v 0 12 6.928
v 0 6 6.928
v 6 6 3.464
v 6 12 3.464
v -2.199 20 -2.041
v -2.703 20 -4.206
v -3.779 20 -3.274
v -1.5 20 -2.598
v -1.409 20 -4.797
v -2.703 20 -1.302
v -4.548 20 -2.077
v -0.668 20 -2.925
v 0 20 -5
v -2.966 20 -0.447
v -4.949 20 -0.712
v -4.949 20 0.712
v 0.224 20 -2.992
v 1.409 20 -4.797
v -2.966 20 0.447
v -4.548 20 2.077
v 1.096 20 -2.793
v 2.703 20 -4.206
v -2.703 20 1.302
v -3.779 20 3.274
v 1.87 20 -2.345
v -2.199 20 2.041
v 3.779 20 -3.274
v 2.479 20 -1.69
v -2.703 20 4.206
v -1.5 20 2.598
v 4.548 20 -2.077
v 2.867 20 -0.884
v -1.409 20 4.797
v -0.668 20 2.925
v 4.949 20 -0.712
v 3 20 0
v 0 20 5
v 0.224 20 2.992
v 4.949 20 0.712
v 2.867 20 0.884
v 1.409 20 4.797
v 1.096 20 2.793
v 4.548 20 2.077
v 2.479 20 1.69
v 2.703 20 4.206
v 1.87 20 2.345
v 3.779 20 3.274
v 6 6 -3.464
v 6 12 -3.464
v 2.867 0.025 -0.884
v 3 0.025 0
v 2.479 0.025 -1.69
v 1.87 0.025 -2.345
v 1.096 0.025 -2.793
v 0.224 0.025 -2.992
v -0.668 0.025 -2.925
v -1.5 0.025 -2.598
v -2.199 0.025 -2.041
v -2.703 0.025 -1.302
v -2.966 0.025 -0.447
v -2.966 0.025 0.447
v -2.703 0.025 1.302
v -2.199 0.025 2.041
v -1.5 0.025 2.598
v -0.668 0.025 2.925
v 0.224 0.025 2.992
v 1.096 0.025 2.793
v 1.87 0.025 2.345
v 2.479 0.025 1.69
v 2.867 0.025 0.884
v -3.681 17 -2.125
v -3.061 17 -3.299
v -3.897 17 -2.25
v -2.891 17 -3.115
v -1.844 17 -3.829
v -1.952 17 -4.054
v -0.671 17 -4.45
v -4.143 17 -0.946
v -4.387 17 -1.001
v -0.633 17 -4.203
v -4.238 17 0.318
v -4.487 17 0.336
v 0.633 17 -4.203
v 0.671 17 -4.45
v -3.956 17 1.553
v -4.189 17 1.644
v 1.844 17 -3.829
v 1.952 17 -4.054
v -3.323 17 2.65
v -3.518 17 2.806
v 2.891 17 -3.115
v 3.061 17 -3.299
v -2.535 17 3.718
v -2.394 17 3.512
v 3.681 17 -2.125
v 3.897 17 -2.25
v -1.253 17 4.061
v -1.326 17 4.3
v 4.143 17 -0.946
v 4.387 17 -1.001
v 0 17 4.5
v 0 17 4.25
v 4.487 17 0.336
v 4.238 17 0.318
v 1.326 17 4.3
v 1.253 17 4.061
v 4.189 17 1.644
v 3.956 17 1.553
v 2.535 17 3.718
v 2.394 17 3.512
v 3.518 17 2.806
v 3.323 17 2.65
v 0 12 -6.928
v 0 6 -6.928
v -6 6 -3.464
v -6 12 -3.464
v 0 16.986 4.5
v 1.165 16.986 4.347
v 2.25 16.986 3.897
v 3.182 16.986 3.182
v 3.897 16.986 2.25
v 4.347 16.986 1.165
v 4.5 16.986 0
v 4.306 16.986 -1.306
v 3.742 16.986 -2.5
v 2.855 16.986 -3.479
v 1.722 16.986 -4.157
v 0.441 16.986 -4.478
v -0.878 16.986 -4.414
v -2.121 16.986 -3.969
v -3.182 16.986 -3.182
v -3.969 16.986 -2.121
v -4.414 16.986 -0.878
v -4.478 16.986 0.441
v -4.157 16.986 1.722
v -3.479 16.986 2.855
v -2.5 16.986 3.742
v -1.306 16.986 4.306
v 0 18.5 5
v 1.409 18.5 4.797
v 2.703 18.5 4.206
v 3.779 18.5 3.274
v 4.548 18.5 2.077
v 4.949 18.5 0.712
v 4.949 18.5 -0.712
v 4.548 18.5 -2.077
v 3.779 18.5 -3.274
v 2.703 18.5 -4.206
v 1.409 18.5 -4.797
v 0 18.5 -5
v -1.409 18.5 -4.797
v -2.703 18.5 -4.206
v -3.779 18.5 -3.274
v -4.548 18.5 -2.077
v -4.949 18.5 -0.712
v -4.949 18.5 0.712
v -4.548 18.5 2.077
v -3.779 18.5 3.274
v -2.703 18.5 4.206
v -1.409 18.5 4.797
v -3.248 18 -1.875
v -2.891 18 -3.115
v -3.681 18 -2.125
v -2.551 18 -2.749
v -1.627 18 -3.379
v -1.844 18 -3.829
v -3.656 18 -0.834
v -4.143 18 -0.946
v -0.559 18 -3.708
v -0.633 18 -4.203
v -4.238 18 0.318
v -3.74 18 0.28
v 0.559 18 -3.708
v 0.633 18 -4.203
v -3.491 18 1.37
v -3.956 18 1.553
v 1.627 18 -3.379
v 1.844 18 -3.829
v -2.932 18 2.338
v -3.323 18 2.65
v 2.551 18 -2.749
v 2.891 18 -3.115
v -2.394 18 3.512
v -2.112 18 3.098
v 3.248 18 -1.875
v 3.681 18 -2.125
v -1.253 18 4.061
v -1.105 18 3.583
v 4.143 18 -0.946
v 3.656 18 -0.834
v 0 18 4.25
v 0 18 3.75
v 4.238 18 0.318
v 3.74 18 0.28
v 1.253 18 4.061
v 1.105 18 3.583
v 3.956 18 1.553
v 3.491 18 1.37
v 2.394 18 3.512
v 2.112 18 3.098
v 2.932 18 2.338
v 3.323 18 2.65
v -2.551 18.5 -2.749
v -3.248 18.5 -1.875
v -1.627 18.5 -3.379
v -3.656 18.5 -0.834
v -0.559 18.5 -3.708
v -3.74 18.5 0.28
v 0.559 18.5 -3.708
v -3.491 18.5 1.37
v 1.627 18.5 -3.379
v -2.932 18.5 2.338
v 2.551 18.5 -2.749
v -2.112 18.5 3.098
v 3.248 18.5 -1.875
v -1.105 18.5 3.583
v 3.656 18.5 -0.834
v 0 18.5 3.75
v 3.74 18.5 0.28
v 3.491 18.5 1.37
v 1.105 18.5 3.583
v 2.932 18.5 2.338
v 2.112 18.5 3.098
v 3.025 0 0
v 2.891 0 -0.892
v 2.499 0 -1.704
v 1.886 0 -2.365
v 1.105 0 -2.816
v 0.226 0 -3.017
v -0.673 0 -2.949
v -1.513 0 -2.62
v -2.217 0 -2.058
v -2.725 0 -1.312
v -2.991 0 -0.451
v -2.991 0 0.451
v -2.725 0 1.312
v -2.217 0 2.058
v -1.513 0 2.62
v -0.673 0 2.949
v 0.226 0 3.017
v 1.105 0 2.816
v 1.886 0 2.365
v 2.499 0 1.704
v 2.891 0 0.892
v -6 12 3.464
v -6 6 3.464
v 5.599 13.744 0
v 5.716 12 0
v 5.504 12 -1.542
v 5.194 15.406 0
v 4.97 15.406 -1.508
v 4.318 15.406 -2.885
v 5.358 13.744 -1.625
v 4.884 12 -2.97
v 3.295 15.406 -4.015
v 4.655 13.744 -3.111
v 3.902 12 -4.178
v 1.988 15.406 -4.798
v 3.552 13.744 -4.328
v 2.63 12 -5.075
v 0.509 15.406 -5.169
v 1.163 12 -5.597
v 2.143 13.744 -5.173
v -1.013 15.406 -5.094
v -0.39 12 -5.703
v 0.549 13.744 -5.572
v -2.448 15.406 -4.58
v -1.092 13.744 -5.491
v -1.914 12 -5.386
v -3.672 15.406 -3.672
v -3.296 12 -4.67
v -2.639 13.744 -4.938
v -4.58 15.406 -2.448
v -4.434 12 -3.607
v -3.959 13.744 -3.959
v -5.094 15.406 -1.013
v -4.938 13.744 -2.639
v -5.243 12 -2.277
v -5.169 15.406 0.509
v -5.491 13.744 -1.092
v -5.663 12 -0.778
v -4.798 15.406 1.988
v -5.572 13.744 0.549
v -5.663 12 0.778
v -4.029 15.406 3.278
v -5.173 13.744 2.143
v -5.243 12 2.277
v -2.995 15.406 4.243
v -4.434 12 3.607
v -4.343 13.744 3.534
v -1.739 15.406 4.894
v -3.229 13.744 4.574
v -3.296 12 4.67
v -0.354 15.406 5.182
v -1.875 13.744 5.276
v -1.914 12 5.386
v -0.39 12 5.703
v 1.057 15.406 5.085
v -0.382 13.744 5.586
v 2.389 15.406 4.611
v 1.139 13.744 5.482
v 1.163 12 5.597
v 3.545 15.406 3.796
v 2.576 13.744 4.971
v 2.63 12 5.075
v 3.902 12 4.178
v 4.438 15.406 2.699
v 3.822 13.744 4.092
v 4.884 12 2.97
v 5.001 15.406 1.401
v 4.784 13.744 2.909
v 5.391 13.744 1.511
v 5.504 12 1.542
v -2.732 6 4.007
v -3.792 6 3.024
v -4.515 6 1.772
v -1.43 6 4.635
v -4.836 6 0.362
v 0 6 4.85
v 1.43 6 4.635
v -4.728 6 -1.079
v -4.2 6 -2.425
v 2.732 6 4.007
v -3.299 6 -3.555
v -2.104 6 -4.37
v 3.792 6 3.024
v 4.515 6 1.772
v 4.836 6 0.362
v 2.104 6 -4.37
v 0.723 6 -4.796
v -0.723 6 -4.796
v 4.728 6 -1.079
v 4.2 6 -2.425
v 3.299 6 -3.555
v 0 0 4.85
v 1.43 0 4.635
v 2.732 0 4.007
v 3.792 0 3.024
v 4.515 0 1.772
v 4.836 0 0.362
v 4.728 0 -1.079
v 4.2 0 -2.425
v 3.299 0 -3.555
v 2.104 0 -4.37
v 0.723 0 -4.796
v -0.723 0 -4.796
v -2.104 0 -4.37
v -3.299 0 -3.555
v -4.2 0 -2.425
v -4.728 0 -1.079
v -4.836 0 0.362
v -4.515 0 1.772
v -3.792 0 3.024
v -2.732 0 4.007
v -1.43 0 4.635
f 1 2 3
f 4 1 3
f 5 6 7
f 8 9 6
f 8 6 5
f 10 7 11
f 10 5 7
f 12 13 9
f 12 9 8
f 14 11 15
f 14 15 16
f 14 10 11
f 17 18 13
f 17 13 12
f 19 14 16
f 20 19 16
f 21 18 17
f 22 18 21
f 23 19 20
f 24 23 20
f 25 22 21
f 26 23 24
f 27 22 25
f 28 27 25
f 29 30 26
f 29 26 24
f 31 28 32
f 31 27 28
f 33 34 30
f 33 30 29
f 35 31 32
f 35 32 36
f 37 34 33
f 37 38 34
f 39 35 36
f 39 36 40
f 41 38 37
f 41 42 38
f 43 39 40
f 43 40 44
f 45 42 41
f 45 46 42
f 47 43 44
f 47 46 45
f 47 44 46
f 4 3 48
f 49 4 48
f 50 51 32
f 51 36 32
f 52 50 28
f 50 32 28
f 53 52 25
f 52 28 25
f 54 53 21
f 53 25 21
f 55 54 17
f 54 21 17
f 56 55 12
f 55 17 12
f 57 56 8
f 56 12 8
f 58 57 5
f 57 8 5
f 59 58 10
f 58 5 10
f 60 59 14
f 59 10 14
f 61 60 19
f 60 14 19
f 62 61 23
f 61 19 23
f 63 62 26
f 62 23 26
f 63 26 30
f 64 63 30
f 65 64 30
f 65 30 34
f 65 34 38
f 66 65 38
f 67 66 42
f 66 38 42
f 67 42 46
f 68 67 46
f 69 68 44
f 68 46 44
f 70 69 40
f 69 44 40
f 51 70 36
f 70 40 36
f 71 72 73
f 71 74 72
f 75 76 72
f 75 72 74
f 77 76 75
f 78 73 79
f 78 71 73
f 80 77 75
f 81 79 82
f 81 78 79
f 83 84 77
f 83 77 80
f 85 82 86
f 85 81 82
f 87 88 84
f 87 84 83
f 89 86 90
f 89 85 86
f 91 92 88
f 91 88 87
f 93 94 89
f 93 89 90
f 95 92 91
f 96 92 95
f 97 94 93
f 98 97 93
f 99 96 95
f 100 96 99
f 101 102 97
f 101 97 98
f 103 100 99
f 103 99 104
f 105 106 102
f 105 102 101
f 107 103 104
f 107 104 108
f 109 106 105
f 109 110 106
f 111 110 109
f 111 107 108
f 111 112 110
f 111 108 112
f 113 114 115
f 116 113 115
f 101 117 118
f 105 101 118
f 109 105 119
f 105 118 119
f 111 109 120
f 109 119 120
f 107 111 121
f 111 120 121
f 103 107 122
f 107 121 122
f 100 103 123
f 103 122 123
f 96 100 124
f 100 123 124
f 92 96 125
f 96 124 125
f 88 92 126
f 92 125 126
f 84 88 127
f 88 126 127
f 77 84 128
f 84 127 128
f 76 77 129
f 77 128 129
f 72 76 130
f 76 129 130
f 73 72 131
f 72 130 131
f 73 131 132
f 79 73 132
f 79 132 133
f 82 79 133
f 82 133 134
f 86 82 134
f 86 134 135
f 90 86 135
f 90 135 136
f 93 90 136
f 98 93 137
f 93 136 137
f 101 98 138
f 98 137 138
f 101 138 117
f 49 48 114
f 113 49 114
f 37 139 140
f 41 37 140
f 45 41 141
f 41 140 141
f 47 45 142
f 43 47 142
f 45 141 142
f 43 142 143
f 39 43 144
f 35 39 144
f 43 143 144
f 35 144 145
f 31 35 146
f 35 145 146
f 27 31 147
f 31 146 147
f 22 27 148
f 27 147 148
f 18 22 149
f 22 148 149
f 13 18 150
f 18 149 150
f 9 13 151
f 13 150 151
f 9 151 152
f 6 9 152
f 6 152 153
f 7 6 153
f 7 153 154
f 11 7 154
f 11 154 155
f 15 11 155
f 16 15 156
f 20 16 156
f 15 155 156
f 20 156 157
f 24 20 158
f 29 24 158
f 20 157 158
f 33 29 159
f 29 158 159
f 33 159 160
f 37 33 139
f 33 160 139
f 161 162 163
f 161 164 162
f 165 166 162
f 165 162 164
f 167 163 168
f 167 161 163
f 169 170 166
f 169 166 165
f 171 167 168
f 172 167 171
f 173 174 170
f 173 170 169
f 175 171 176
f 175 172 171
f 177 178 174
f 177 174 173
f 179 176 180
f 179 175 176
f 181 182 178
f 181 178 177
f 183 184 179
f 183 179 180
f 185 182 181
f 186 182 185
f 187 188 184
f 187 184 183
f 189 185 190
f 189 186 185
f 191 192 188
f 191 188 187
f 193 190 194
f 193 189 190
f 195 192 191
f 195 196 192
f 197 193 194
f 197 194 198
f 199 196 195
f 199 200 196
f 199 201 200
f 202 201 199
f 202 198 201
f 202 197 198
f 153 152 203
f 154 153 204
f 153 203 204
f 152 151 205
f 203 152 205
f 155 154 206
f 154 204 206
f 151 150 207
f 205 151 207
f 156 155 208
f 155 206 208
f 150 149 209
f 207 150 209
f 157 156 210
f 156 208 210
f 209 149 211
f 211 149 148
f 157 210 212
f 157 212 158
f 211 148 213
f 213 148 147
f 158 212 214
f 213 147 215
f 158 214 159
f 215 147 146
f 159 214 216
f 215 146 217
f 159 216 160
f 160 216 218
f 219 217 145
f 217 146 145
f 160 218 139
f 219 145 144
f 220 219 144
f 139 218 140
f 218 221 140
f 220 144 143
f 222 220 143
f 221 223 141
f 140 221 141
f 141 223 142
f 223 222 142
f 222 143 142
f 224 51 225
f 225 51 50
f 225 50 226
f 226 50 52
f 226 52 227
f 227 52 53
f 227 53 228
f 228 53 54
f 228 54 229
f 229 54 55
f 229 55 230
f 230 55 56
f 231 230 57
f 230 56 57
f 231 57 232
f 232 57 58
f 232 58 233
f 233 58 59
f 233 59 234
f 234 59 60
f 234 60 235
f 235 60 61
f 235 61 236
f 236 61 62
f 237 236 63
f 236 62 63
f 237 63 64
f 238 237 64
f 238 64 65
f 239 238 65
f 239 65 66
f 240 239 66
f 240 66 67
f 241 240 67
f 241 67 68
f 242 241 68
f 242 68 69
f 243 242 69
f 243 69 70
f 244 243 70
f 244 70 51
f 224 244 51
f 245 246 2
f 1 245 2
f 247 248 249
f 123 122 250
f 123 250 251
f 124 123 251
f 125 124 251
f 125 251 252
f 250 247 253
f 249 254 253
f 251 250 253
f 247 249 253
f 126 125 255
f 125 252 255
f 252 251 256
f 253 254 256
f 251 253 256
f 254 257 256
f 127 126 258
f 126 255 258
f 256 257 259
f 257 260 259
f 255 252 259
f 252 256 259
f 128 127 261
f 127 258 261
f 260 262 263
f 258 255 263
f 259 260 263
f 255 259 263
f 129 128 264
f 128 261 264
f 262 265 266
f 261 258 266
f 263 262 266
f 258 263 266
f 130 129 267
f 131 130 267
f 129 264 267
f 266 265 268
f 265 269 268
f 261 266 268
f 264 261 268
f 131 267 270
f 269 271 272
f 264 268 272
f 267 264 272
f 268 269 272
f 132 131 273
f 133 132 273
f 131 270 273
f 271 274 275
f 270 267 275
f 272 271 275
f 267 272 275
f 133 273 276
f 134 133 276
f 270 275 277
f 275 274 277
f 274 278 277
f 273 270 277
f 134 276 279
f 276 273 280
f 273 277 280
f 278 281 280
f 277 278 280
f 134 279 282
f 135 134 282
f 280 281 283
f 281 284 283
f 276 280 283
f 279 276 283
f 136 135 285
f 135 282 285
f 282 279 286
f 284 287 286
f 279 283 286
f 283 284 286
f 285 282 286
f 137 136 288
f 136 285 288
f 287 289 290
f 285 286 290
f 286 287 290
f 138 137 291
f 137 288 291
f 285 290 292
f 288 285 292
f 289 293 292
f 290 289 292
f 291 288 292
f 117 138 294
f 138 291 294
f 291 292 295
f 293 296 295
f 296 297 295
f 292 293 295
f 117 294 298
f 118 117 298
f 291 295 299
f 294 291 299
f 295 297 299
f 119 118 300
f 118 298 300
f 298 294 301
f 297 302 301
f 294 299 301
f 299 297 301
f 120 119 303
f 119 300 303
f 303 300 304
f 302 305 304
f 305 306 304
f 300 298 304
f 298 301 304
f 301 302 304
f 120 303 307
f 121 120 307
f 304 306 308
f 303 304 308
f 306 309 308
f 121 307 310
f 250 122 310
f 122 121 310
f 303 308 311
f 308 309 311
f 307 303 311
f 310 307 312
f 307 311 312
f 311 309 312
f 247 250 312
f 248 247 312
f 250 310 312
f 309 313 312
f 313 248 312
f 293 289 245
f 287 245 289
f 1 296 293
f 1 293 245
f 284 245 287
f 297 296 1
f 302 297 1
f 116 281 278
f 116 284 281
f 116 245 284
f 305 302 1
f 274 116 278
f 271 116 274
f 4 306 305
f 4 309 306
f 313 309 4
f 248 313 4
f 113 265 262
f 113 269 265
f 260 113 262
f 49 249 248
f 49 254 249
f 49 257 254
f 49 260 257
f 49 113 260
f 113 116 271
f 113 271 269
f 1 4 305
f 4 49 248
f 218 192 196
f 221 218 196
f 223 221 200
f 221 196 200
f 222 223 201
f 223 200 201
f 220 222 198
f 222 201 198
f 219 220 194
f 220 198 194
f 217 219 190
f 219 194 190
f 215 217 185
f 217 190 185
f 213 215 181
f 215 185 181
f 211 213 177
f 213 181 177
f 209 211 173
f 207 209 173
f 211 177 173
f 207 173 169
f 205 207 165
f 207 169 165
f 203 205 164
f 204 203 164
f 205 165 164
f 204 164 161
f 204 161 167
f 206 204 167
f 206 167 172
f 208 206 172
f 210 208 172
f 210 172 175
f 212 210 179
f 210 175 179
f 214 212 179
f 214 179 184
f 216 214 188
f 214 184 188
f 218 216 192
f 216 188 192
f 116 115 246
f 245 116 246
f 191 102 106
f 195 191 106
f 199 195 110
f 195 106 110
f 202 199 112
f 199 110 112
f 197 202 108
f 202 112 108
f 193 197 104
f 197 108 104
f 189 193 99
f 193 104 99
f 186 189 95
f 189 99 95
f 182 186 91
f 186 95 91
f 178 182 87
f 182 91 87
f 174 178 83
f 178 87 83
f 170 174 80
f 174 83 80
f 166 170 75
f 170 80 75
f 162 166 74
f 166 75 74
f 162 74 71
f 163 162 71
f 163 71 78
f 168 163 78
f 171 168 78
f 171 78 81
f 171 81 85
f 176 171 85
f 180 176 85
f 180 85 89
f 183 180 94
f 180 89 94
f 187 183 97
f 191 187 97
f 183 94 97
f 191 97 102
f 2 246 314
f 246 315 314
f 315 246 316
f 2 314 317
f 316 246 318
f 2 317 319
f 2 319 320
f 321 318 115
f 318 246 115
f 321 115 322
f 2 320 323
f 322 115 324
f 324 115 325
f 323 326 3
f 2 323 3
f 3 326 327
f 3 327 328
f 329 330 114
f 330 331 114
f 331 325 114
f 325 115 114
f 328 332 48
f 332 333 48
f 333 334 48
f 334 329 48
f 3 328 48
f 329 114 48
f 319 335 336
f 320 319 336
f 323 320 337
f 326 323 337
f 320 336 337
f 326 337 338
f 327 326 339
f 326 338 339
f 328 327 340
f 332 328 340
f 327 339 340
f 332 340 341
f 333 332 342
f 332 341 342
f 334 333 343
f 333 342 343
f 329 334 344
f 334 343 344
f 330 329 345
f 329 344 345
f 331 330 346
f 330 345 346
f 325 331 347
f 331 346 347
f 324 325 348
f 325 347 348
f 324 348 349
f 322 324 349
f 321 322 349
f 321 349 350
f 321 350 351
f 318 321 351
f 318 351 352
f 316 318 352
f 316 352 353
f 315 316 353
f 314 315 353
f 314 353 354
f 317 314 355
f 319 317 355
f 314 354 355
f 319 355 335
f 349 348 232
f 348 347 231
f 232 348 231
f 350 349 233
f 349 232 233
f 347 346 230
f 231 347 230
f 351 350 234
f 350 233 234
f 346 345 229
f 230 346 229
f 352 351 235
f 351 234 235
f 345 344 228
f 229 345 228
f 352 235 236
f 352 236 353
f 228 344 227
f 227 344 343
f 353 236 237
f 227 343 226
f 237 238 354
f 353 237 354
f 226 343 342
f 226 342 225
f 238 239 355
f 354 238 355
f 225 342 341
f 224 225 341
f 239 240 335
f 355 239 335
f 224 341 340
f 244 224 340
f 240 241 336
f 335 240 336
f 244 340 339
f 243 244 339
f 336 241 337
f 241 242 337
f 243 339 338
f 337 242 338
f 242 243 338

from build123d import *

# Parameters (mm, degrees)
SKETCH_1_R            = 4.85
EXTRUDE_1_DEPTH       = 6
EXTRUDE_2_DEPTH       = 6
SKETCH_3_R            = 4.5
EXTRUDE_3_DEPTH       = 5
SKETCH_4_R            = 4.25
EXTRUDE_4_DEPTH       = 1
SKETCH_5_R            = 3.75
EXTRUDE_5_DEPTH       = 0.5
SKETCH_6_R            = 5
EXTRUDE_6_DEPTH       = 1.5
F_6_0MM_1_D           = 6
F_6_0MM_1_CSINK_D     = 6.05
F_6_0MM_1_CSINK_ANGLE = 90


with BuildPart() as part:
    # 草图1 → 凸台-拉伸1 (new body)
    with BuildSketch(Plane(origin=(0, 0, 0), x_dir=(1, 0, 0), z_dir=(0, 1, 0))):
        with Locations(Location((0, 0, 0), (0, 0, 270))):
            Circle(SKETCH_1_R)
    extrude(amount=EXTRUDE_1_DEPTH)

    # 草图2 → 凸台-拉伸2 (add)
    with BuildSketch(Plane(origin=(0, 6, 0), x_dir=(1, 0, 0), z_dir=(0, 1, 0))):
        Polygon((6, 3.464101615), (0, 6.92820323), (-6, 3.464101615), (-6, -3.464101615), (0, -6.92820323), (6, -3.464101615), align=None)
    extrude(amount=EXTRUDE_2_DEPTH)

    # 草图3 → 凸台-拉伸3 (add)
    with BuildSketch(Plane(origin=(0, 12, 0), x_dir=(1, 0, 0), z_dir=(0, 1, 0))):
        with Locations(Location((0, 0, 0), (0, 0, 270))):
            Circle(SKETCH_3_R)
    extrude(amount=EXTRUDE_3_DEPTH)

    # 草图4 → 凸台-拉伸4 (add)
    with BuildSketch(Plane(origin=(0, 17, 0), x_dir=(1, 0, 0), z_dir=(0, 1, 0))):
        with Locations(Location((0, 0, 0), (0, 0, 270))):
            Circle(SKETCH_4_R)
    extrude(amount=EXTRUDE_4_DEPTH)

    # 草图5 → 凸台-拉伸5 (add)
    with BuildSketch(Plane(origin=(0, 18, 0), x_dir=(1, 0, 0), z_dir=(0, 1, 0))):
        with Locations(Location((0, 0, 0), (0, 0, 270))):
            Circle(SKETCH_5_R)
    extrude(amount=EXTRUDE_5_DEPTH)

    # 草图6 → 凸台-拉伸6 (add)
    with BuildSketch(Plane(origin=(0, 18.5, 0), x_dir=(1, 0, 0), z_dir=(0, 1, 0))):
        with Locations(Location((0, 0, 0), (0, 0, 270))):
            Circle(SKETCH_6_R)
    extrude(amount=EXTRUDE_6_DEPTH)

    # 草图7 → 旋转1 (revolve)
    with BuildSketch(Plane.XY, mode=Mode.PRIVATE) as revolve_1_sk:
        with BuildLine():
            Line((-5.71614298, 12), (-4.5, 12))
            Line((-4.5, 12), (-4.5, 16.986349243))
            add(Edge.make_bspline(
                [(-4.5, 16.986349243), (-5.756767144, 14.677598977), (-5.71614298, 12)],
                knots=[0, 0, 0, 1, 1, 1], degree=2))
        make_face()
    revolve(revolve_1_sk.sketch.rotate(Axis((0, 12, 0), (0, 1, 0)), 180), axis=Axis((0, 12, 0), (0, 1, 0)))

    # Ø6.0mm 暗销孔1 (through all)
    with Locations(Plane(origin=(0, 0, 0), x_dir=(-1, 0, 0), z_dir=(0, -1, 0))):
        with Locations((0, 0)):
            CounterSinkHole(F_6_0MM_1_D / 2, F_6_0MM_1_CSINK_D / 2, counter_sink_angle=F_6_0MM_1_CSINK_ANGLE)


solid = part.part
